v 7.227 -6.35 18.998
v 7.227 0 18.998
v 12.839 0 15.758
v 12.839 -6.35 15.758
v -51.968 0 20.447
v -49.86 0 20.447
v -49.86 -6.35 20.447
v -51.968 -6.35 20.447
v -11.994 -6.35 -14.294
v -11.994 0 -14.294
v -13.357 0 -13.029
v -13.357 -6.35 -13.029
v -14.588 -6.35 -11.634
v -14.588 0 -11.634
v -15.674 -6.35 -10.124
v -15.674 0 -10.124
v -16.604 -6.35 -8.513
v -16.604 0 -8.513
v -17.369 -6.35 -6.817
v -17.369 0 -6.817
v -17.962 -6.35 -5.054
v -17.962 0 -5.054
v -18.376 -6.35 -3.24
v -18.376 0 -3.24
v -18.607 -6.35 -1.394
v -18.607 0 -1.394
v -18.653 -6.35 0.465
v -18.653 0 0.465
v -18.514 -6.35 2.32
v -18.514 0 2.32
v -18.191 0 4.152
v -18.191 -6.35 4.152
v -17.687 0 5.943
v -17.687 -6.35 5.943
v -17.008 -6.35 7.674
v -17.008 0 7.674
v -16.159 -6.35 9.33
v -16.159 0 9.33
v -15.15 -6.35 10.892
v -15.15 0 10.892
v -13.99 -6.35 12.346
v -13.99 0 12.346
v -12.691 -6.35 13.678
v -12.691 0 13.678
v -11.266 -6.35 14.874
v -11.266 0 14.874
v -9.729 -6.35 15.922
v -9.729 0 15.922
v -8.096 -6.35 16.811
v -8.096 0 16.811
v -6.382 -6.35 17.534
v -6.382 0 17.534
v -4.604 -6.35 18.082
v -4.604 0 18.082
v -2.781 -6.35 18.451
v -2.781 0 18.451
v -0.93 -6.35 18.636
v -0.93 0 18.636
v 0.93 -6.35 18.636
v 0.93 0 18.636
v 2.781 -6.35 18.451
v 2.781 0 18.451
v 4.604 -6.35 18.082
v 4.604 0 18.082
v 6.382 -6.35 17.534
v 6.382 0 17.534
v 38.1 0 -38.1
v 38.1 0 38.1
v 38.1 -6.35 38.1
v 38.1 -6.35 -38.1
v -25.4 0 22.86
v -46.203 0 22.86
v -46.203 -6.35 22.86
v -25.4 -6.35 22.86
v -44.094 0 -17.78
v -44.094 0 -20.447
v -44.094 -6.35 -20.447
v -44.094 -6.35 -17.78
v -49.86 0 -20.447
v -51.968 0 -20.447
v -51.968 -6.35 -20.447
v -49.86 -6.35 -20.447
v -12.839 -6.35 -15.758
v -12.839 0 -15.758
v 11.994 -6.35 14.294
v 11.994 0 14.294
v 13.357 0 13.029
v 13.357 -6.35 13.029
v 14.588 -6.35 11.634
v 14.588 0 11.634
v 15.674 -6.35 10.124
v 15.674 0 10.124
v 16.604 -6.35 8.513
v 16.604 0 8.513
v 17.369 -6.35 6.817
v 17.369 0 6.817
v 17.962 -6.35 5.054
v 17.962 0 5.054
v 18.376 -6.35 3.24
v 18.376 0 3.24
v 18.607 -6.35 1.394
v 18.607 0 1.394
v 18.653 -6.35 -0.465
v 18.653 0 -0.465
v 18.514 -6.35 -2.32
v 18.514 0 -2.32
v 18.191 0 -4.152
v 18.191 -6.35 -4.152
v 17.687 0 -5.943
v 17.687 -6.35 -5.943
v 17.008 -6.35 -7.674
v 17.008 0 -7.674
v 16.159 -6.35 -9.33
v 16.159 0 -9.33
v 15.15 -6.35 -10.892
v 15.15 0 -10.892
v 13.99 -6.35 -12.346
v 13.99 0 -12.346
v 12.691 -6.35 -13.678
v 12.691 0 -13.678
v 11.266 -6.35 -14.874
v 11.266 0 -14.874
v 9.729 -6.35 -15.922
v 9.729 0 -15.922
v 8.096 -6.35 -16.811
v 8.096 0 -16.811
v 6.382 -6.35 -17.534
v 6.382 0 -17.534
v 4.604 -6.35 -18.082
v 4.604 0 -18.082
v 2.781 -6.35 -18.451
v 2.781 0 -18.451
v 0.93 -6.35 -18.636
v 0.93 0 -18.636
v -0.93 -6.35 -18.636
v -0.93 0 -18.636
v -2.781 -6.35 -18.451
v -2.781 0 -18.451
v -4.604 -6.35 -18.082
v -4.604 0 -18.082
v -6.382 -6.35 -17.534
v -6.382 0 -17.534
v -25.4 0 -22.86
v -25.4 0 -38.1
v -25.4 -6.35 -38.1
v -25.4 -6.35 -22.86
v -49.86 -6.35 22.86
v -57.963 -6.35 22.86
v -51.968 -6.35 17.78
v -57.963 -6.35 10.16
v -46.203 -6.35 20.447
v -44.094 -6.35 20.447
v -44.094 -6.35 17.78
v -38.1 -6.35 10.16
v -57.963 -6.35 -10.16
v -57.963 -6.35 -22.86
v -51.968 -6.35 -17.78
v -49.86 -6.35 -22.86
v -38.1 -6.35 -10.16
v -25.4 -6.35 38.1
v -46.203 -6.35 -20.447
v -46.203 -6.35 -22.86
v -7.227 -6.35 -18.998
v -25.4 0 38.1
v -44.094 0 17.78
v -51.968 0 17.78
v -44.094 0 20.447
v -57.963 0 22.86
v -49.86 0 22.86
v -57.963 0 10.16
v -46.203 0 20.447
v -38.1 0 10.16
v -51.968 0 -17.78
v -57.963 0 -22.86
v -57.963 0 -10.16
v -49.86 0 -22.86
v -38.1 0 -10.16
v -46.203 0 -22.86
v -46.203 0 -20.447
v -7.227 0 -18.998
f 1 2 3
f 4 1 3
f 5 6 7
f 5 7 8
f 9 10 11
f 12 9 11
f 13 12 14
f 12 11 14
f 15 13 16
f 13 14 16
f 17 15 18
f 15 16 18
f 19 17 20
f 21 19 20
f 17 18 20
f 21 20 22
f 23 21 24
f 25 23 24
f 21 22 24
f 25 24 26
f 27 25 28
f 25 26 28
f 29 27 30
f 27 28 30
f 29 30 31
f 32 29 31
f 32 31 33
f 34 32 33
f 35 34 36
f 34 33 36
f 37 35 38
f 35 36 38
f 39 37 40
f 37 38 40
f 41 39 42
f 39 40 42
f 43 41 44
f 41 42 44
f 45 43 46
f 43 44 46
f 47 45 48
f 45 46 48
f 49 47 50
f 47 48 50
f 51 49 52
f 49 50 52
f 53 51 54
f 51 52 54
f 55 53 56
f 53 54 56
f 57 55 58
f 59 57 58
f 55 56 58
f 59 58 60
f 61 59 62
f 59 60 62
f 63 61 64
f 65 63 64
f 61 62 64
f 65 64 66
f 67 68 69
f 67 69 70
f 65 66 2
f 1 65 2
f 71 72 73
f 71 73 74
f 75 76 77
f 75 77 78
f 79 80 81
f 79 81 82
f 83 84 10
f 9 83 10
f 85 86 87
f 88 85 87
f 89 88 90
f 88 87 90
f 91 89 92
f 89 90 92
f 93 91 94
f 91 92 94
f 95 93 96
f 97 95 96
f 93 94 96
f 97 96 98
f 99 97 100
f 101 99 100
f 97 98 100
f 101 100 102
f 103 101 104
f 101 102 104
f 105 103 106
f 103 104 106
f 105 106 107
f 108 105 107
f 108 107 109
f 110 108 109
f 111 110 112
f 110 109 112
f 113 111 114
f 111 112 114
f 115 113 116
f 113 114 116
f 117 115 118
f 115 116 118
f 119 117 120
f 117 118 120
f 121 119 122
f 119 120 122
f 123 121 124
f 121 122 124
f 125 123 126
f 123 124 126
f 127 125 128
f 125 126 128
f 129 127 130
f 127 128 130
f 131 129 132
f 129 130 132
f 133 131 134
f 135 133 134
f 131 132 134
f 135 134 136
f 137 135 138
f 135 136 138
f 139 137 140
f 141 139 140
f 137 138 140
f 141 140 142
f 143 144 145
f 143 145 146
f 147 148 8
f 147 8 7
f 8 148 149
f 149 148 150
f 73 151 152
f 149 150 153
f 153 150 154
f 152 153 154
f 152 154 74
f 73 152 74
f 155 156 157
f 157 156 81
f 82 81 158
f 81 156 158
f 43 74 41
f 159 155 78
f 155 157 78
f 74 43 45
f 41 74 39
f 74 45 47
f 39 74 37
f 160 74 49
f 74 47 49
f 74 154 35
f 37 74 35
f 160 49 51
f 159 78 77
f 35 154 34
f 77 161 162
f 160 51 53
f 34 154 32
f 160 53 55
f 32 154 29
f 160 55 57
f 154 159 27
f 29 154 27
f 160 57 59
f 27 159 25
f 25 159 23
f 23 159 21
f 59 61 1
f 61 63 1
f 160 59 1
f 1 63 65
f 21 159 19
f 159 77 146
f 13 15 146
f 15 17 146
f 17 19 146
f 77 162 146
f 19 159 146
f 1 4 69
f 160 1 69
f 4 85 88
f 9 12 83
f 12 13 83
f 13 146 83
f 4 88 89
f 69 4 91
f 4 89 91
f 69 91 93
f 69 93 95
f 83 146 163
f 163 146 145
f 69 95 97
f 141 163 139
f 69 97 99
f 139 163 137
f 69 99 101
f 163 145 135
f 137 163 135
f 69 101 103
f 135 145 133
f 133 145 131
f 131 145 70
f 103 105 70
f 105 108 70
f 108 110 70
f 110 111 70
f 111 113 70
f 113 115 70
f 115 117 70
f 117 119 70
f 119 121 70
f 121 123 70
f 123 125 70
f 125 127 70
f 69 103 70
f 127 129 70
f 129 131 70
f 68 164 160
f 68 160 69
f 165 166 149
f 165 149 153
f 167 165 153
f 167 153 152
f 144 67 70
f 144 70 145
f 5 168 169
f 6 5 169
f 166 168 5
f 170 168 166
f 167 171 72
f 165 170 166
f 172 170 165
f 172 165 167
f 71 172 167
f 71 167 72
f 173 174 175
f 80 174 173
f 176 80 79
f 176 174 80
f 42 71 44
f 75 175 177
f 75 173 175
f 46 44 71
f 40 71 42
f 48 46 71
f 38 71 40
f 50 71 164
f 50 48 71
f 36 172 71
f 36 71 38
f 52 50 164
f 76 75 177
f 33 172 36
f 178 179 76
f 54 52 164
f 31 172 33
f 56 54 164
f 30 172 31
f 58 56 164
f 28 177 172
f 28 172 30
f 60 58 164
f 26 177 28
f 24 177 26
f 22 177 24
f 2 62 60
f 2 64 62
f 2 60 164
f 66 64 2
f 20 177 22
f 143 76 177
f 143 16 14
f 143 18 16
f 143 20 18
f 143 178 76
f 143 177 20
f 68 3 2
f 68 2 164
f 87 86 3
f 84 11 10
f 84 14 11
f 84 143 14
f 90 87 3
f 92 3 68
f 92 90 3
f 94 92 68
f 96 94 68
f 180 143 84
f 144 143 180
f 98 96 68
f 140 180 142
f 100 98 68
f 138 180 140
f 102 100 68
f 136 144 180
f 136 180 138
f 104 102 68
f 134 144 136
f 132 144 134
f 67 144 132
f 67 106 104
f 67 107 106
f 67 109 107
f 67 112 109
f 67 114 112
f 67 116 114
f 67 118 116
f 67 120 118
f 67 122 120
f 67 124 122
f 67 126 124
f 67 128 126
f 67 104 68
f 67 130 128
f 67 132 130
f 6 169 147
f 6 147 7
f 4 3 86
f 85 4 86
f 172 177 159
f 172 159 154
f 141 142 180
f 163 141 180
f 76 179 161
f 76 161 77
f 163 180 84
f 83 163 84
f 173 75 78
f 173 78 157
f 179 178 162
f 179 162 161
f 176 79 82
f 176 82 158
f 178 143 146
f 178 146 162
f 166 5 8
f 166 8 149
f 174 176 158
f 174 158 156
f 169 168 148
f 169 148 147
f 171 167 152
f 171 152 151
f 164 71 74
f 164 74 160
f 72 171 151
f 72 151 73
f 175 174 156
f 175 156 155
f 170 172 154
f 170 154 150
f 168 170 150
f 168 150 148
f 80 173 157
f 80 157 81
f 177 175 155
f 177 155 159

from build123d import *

# Parameters (mm, degrees)
BOSS_EXTRUDE1_DEPTH = 6.35


with BuildPart() as part:
    # Sketch1 → Boss-Extrude1 (new body)
    with BuildSketch(Plane(origin=(0, 0, 0), x_dir=(1, 0, 0), z_dir=(0, 1, 0))):
        Polygon((-25.4, -38.1), (38.1, -38.1), (38.1, 38.1), (-25.4, 38.1), (-25.4, 22.86), (-38.1, 22.86), (-46.2026, 22.86), (-46.2026, 20.447), (-44.0944, 20.447), (-44.0944, 17.78), (-51.9684, 17.78), (-51.9684, 20.447), (-49.8602, 20.447), (-49.8602, 22.86), (-57.9628, 22.86), (-57.9628, 10.16), (-38.1, 10.16), (-38.1, -10.16), (-57.9628, -10.16), (-57.9628, -22.86), (-49.8602, -22.86), (-49.8602, -20.447), (-51.9684, -20.447), (-51.9684, -17.78), (-44.0944, -17.78), (-44.0944, -20.447), (-46.2026, -20.447), (-46.2026, -22.86), (-38.1, -22.86), (-25.4, -22.86), align=None)
        with BuildLine():
            Line((7.227071664, -18.99759929), (12.838867764, -15.757627301))
            Line((12.838867764, -15.757627301), (11.99371709, -14.293783392))
            ThreePointArc((11.99371709, -14.293783392), (16.159242555, 9.329543039), (-6.381920989, 17.533755382))
            Line((-6.381920989, 17.533755382), (-7.227071664, 18.99759929))
            Line((-7.227071664, 18.99759929), (-12.838867764, 15.757627301))
            Line((-12.838867764, 15.757627301), (-11.99371709, 14.293783392))
            ThreePointArc((-11.99371709, 14.293783392), (-16.159242555, -9.329543039), (6.381920989, -17.533755382))
            Line((6.381920989, -17.533755382), (7.227071664, -18.99759929))
        make_face(mode=Mode.SUBTRACT)
    extrude(amount=-BOSS_EXTRUDE1_DEPTH)


solid = part.part
